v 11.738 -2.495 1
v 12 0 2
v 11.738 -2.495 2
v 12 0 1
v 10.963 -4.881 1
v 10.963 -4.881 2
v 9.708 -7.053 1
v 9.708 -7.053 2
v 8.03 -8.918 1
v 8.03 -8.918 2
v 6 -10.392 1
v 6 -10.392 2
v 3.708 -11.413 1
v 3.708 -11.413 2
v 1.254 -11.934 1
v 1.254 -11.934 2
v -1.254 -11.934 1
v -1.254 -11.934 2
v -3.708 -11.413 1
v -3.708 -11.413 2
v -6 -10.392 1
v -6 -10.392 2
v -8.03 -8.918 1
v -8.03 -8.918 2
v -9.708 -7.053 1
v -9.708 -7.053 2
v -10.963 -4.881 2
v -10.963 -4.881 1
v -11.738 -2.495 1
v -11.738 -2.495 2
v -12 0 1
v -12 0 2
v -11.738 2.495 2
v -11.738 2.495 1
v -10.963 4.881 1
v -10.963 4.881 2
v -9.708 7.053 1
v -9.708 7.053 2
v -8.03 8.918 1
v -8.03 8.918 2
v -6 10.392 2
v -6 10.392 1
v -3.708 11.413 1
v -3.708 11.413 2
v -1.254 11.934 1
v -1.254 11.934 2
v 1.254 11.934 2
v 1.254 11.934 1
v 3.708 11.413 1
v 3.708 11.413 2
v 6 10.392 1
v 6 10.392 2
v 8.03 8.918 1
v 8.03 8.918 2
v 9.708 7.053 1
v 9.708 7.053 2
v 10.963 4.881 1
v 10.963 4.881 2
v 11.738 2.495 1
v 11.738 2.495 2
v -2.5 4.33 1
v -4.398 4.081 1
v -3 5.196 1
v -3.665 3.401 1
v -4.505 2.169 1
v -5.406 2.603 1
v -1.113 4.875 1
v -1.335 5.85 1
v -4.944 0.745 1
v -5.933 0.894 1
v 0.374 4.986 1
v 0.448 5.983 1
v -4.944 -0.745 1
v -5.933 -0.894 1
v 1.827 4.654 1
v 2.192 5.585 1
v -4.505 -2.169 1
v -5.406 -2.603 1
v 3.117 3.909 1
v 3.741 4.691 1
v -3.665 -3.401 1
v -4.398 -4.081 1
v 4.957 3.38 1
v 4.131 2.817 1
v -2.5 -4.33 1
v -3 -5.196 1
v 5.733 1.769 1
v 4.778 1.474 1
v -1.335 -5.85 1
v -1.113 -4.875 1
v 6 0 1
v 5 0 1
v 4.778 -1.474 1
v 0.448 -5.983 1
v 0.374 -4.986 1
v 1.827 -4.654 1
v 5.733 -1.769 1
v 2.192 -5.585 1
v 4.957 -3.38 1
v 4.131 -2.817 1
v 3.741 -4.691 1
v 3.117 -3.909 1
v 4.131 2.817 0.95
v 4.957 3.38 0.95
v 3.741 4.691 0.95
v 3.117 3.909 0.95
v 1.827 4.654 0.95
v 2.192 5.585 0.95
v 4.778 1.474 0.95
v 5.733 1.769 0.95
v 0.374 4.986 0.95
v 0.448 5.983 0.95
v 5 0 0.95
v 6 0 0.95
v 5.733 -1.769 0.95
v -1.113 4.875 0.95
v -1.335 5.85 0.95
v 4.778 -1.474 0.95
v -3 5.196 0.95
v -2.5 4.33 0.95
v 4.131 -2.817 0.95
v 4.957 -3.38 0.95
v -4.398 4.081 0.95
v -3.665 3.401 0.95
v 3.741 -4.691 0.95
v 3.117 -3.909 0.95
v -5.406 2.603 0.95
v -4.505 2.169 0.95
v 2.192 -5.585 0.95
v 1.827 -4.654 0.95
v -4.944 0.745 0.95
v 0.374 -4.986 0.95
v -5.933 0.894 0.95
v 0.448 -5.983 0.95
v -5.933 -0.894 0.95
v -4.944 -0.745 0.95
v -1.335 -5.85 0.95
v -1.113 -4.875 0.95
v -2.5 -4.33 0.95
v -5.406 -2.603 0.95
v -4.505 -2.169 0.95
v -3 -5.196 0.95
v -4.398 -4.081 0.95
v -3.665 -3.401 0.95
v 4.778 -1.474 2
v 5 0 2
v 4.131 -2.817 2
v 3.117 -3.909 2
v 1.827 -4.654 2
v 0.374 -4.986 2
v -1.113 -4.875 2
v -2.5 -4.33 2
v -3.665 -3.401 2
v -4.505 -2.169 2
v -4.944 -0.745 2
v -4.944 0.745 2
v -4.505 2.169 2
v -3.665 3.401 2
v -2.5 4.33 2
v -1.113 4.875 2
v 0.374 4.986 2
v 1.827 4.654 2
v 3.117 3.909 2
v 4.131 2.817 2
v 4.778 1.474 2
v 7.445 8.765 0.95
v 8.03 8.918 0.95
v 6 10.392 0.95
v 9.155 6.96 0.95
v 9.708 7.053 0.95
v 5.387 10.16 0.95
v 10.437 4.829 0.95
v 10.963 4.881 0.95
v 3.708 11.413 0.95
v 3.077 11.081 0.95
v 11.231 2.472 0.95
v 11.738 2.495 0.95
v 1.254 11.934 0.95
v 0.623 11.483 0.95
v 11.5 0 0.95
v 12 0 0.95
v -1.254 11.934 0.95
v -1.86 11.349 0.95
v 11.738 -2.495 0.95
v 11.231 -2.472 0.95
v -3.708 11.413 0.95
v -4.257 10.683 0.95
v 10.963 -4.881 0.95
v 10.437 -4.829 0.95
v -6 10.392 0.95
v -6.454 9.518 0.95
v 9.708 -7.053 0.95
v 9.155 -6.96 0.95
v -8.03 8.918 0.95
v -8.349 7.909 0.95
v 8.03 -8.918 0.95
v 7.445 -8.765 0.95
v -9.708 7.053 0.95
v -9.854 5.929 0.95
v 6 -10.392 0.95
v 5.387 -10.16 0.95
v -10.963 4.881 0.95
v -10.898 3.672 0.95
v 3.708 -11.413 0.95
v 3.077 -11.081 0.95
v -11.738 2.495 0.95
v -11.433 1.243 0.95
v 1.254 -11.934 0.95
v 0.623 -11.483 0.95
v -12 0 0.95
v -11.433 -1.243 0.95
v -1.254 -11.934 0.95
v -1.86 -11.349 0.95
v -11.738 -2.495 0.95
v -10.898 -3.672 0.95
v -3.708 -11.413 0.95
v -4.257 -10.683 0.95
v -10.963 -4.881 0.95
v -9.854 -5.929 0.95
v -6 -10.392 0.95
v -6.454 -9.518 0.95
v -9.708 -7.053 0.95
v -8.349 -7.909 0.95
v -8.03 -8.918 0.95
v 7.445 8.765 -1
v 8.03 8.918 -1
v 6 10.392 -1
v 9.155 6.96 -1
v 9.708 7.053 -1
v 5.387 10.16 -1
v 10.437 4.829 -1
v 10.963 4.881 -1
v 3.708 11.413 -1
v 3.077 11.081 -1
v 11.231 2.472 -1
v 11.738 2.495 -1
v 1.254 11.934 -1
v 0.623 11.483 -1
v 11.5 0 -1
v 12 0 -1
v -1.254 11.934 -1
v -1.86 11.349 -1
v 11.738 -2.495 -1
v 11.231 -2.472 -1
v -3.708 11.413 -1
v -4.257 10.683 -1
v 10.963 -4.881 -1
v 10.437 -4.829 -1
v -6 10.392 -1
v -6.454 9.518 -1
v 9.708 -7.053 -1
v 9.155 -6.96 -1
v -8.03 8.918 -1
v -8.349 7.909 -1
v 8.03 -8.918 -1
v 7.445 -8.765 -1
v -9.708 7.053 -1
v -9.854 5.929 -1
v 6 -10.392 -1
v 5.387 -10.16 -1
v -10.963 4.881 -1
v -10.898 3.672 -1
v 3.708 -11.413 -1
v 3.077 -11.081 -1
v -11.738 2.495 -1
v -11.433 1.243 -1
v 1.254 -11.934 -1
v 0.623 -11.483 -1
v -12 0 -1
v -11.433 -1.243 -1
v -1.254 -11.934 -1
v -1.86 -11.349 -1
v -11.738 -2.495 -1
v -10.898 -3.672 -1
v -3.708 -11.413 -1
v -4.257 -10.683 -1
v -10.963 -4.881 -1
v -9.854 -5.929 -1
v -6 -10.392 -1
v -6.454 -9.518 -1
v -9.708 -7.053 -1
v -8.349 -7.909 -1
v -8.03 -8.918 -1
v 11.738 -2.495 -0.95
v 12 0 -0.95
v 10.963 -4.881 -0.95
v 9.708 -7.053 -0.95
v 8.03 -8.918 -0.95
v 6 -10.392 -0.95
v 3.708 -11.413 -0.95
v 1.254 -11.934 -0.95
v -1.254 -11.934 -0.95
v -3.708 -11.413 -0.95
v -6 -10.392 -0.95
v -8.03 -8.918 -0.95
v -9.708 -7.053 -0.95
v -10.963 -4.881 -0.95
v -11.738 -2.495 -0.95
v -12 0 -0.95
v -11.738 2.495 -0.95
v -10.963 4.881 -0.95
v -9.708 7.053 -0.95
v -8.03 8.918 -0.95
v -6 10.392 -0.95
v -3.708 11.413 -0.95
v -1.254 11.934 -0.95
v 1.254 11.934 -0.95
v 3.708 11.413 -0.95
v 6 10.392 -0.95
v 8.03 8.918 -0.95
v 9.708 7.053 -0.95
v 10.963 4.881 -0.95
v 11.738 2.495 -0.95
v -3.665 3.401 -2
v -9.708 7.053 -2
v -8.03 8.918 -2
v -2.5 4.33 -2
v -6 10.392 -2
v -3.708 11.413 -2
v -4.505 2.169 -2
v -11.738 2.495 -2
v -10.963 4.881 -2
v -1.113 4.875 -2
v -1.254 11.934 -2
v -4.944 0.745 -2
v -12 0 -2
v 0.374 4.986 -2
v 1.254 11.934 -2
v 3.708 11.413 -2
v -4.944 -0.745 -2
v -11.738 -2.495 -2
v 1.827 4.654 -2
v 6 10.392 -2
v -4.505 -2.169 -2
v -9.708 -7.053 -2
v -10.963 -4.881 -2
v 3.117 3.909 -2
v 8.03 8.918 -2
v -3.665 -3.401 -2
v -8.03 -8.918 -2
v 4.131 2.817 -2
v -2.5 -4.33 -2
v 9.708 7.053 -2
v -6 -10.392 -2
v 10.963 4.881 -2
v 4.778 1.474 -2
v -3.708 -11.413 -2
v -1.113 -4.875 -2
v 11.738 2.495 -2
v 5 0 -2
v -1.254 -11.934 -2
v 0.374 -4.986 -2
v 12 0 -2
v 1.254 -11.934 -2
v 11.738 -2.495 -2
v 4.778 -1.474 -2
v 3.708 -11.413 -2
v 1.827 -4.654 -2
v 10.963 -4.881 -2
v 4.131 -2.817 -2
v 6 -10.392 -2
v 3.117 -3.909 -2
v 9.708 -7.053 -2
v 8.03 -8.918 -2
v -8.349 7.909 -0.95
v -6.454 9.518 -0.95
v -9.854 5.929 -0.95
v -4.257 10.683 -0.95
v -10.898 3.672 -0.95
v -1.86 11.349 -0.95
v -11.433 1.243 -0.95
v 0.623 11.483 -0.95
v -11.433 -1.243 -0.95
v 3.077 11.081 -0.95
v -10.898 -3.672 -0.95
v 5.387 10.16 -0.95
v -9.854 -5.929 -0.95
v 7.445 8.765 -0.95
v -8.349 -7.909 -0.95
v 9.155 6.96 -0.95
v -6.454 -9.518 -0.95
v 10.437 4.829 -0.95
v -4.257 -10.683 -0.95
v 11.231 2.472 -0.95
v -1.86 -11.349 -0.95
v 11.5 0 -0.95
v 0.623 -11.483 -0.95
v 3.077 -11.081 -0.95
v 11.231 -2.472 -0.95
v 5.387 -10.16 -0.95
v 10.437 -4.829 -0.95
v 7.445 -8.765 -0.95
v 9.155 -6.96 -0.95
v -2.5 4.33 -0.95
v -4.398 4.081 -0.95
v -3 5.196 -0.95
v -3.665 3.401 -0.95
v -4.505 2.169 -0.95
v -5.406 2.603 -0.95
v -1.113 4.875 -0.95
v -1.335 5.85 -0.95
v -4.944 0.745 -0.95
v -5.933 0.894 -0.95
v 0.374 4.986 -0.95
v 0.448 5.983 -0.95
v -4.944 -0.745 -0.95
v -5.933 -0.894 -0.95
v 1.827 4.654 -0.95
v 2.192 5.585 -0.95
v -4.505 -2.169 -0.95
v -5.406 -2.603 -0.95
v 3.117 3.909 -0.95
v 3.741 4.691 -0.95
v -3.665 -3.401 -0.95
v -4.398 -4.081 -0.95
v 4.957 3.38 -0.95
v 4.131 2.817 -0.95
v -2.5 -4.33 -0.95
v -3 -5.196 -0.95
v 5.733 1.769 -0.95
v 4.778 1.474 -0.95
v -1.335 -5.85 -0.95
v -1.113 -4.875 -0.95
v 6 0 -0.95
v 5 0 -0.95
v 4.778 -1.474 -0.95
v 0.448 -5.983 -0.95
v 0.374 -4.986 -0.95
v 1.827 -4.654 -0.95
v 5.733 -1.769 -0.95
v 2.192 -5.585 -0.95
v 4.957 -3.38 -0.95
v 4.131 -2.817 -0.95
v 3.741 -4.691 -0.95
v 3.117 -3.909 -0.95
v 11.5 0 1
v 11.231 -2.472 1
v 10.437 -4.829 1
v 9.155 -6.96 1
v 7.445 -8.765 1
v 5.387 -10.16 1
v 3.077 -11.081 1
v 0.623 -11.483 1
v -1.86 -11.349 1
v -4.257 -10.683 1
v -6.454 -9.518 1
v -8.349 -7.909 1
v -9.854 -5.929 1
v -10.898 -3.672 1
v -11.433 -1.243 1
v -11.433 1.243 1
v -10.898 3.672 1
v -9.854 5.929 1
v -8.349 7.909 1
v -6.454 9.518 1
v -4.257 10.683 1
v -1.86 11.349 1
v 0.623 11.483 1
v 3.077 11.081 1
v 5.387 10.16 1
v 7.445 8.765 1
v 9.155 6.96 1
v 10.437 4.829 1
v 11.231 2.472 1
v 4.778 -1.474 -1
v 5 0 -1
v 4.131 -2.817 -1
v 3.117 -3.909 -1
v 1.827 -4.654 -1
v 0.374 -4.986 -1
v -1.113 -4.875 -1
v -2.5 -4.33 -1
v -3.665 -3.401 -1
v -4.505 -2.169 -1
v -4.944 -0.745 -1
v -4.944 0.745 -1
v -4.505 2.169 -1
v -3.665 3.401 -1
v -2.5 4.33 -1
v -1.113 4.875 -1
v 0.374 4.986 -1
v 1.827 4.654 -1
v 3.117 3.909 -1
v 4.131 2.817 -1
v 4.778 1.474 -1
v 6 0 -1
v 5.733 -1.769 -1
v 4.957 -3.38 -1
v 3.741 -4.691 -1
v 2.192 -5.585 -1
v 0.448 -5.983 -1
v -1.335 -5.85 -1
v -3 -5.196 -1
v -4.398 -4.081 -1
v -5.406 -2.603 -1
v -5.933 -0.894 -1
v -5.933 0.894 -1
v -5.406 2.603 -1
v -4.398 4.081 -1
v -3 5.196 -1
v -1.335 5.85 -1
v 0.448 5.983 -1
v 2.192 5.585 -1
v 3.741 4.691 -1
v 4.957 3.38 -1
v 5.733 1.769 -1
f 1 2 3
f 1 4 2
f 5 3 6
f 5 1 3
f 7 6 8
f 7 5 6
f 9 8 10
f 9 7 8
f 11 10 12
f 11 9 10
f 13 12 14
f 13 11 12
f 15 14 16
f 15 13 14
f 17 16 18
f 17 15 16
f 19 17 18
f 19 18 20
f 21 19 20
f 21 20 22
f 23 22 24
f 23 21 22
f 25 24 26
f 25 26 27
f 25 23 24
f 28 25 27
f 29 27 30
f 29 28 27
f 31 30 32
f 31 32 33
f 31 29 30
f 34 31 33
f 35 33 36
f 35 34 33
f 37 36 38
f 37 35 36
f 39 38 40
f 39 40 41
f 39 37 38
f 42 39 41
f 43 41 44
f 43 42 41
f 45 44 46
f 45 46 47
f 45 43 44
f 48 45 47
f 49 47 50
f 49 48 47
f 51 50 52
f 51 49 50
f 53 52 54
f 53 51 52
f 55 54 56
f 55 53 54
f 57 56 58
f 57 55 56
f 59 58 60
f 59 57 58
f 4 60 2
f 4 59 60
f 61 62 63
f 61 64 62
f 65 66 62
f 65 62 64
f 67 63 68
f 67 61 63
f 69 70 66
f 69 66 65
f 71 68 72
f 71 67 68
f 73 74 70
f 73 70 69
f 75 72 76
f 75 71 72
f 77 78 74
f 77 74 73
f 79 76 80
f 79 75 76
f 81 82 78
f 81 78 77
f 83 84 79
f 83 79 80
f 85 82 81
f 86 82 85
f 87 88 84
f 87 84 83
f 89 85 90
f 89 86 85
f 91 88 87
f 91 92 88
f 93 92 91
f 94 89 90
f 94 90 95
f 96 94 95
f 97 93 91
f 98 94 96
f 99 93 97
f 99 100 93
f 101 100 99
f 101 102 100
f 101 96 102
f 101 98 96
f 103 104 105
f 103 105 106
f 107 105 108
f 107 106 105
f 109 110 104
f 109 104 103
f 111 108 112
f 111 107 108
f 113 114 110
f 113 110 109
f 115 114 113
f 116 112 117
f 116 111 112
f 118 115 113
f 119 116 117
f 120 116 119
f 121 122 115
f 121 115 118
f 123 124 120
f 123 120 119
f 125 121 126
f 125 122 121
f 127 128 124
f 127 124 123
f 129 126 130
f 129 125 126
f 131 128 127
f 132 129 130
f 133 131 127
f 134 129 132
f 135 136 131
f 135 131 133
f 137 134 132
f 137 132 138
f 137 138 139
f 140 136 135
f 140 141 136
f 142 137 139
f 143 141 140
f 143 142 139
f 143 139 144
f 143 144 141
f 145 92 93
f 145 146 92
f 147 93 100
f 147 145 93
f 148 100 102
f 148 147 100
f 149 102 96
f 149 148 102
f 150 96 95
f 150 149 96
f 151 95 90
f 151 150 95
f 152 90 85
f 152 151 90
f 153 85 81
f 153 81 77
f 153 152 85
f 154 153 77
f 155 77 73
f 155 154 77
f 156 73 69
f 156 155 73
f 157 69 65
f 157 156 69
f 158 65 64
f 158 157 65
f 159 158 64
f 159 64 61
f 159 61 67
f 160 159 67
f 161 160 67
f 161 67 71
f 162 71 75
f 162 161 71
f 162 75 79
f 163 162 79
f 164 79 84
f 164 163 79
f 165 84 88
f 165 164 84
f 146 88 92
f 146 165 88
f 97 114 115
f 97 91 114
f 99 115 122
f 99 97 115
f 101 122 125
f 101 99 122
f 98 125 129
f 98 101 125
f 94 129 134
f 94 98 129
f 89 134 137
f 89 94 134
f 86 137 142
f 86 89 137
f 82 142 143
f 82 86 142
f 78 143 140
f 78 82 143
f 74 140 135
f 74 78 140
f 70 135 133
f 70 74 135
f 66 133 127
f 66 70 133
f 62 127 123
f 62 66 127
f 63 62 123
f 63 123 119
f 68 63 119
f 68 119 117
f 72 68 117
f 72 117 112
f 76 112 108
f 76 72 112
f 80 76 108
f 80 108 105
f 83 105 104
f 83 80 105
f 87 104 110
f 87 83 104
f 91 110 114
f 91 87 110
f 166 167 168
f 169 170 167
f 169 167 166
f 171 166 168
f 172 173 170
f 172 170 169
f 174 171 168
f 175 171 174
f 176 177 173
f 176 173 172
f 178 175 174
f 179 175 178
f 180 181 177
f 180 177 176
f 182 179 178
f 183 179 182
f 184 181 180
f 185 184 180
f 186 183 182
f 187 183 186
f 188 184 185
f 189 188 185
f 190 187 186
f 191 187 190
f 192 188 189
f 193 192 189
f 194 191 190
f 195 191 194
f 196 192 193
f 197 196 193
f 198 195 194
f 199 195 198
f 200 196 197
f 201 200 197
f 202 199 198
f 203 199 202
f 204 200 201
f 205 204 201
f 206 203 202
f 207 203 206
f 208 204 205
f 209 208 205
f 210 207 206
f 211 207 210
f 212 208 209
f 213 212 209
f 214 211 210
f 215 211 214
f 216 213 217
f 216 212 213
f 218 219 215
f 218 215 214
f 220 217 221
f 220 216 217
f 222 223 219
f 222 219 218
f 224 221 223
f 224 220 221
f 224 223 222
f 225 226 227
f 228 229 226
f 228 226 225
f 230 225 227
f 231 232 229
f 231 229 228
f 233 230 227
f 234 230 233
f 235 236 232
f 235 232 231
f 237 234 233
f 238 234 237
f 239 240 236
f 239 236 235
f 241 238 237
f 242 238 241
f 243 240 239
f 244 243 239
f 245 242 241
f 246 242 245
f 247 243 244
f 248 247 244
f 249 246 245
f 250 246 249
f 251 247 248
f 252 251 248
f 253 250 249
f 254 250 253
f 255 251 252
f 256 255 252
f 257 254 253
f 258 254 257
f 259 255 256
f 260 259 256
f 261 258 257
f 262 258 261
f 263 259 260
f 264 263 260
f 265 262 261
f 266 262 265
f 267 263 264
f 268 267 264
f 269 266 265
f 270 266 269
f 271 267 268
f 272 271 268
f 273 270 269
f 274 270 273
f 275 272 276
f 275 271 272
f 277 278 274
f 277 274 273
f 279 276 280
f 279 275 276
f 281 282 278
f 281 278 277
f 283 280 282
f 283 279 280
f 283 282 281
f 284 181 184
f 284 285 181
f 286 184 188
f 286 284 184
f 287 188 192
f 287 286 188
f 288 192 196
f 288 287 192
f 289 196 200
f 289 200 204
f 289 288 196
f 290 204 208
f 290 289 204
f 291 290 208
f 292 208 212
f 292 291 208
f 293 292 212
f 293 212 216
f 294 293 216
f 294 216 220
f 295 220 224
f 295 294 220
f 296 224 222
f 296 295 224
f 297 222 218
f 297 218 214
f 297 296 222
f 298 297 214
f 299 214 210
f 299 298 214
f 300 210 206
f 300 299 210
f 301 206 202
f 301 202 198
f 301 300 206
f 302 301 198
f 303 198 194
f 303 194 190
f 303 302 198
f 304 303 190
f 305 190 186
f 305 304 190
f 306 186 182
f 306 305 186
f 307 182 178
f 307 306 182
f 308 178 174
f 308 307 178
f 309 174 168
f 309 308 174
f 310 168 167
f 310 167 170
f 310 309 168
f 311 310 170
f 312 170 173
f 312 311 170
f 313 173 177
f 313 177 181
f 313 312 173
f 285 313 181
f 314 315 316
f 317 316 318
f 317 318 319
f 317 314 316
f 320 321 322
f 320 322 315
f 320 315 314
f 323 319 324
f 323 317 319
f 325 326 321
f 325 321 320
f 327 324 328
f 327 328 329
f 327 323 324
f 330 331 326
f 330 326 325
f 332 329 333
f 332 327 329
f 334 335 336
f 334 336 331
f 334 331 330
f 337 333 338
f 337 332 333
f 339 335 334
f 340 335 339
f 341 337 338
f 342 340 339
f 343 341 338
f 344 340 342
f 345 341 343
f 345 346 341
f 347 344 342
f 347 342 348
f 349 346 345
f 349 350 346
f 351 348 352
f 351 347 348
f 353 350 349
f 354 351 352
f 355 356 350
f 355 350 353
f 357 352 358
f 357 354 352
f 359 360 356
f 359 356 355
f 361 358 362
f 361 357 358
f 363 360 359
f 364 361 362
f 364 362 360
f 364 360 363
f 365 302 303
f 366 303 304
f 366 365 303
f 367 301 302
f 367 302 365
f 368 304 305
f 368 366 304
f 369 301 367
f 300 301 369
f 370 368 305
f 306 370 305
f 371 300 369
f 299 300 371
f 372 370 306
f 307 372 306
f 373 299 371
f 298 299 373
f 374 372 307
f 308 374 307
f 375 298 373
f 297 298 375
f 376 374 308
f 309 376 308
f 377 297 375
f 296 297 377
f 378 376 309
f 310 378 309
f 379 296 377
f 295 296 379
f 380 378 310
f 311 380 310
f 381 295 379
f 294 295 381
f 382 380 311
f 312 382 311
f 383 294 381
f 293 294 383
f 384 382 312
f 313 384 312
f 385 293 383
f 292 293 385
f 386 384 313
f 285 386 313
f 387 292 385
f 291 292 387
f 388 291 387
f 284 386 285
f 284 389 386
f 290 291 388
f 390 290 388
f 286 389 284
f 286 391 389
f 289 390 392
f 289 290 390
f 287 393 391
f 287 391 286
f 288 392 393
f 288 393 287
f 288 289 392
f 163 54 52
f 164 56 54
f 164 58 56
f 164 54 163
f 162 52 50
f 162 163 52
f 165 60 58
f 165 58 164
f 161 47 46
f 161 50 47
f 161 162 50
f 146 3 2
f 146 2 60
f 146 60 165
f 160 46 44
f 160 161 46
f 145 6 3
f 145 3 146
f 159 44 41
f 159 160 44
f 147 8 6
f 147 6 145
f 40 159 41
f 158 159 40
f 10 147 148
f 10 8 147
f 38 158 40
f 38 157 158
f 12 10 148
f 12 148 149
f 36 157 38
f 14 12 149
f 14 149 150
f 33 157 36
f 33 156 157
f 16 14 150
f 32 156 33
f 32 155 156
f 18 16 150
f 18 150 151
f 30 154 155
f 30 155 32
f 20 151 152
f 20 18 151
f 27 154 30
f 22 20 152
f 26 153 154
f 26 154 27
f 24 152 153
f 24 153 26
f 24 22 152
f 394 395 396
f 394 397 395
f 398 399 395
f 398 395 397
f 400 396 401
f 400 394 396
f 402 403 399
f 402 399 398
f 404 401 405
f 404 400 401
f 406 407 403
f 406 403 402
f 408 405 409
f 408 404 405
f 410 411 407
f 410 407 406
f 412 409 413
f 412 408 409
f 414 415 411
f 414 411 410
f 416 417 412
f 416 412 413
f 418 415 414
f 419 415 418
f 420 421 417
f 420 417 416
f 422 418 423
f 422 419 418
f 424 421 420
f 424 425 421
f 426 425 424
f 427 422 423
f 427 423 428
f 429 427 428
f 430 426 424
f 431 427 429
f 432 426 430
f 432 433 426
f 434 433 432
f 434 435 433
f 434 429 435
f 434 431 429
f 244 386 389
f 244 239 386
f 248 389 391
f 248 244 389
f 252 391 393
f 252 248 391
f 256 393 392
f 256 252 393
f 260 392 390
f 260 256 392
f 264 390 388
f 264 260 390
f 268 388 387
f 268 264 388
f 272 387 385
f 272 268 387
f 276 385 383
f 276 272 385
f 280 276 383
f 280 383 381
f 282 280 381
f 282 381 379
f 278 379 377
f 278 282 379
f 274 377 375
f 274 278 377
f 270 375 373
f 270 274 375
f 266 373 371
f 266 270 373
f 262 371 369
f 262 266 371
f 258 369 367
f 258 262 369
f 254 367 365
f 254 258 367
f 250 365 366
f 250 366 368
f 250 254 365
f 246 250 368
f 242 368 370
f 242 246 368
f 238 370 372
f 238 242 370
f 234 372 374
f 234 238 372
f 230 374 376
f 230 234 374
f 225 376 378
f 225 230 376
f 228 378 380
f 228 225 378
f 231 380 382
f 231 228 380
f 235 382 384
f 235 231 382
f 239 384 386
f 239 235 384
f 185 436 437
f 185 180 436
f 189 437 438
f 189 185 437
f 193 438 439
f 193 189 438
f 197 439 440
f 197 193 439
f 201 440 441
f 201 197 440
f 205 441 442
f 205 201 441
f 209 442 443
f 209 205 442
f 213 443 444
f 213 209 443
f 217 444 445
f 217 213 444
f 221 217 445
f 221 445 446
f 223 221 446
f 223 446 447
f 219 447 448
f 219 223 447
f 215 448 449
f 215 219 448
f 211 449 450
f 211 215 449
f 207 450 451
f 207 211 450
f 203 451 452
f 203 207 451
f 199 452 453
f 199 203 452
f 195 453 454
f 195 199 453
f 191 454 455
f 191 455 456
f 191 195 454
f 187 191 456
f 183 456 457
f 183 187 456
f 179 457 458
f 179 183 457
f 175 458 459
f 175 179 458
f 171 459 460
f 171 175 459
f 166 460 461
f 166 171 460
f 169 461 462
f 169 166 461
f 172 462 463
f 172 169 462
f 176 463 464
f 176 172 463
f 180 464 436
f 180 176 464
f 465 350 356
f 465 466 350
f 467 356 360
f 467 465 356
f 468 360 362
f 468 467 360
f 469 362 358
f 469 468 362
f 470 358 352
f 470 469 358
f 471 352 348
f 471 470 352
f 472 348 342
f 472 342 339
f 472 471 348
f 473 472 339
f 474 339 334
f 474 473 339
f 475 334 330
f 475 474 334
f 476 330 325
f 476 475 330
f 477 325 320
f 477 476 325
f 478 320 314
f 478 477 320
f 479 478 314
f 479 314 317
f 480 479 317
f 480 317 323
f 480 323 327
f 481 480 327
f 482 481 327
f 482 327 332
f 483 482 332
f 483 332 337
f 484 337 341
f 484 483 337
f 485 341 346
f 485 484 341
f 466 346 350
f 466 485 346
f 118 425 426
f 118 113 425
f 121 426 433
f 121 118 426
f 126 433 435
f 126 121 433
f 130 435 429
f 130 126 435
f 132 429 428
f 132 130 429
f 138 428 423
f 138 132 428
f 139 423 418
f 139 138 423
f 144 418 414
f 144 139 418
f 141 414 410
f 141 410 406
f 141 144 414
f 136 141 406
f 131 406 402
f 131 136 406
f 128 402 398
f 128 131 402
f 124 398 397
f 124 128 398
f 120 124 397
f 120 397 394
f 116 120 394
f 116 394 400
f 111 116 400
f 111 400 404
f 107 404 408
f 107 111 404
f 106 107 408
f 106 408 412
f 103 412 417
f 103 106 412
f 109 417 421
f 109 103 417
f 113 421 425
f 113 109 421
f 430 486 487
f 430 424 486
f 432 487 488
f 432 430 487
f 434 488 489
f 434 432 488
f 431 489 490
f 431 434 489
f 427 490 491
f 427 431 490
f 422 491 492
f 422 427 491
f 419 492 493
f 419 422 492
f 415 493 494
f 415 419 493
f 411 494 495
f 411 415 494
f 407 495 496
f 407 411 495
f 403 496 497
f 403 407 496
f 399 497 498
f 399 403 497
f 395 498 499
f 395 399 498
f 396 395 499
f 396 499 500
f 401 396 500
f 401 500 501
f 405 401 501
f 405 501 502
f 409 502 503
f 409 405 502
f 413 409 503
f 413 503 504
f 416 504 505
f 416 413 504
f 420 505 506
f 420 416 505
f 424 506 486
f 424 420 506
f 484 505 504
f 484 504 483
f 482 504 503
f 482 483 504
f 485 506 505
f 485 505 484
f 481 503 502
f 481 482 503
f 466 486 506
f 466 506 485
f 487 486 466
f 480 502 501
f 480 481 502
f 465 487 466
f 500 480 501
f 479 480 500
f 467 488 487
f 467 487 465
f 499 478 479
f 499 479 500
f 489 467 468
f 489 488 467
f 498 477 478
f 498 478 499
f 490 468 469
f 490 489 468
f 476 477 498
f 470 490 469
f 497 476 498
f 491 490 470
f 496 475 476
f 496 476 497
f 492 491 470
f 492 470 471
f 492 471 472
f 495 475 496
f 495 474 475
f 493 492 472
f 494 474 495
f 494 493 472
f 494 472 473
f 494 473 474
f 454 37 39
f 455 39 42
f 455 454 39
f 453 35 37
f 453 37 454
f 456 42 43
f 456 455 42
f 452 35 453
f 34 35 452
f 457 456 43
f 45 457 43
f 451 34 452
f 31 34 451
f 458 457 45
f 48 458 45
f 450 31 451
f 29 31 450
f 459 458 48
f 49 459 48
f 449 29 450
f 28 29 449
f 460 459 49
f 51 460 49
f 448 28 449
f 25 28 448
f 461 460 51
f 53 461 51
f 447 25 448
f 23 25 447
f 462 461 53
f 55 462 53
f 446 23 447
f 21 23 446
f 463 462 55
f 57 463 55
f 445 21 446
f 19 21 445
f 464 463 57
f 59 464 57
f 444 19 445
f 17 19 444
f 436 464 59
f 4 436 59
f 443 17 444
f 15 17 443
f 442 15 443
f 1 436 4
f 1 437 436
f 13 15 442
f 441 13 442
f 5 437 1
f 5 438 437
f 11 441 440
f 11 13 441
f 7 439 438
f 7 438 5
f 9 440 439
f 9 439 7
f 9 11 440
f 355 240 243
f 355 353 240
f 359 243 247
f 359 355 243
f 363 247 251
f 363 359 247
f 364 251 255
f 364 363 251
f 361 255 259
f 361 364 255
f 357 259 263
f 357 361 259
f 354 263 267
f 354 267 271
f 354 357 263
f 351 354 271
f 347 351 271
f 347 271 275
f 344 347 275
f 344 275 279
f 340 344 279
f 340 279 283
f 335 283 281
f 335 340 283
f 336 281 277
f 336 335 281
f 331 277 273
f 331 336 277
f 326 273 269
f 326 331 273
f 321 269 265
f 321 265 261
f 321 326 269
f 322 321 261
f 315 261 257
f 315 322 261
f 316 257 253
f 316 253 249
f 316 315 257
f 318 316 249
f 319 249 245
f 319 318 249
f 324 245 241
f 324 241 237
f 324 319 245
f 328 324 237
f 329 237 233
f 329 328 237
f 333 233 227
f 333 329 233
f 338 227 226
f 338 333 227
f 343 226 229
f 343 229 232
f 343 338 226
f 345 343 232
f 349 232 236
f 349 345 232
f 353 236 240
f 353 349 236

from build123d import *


with BuildPart() as part:
    # 草图2 → 旋转1 (revolve)
    with BuildSketch(Plane(origin=(0, 0, 0), x_dir=(0, 0, -1), z_dir=(1, 0, 0)), mode=Mode.PRIVATE) as revolve_1_sk:
        Polygon((1, 12), (2, 12), (2, 5), (1, 5), (1, 6), (0.95, 6), (0.95, 5), (-0.95, 5), (-0.95, 6), (-1, 6), (-1, 5), (-2, 5), (-2, 12), (-1, 12), (-1, 11.5), (-0.95, 11.5), (-0.95, 12), (0.95, 12), (0.95, 11.5), (1, 11.5), align=None)
    revolve(revolve_1_sk.sketch.rotate(Axis((0, 0, 2), (0, 0, -1)), 90), axis=Axis((0, 0, 2), (0, 0, -1)))


solid = part.part
